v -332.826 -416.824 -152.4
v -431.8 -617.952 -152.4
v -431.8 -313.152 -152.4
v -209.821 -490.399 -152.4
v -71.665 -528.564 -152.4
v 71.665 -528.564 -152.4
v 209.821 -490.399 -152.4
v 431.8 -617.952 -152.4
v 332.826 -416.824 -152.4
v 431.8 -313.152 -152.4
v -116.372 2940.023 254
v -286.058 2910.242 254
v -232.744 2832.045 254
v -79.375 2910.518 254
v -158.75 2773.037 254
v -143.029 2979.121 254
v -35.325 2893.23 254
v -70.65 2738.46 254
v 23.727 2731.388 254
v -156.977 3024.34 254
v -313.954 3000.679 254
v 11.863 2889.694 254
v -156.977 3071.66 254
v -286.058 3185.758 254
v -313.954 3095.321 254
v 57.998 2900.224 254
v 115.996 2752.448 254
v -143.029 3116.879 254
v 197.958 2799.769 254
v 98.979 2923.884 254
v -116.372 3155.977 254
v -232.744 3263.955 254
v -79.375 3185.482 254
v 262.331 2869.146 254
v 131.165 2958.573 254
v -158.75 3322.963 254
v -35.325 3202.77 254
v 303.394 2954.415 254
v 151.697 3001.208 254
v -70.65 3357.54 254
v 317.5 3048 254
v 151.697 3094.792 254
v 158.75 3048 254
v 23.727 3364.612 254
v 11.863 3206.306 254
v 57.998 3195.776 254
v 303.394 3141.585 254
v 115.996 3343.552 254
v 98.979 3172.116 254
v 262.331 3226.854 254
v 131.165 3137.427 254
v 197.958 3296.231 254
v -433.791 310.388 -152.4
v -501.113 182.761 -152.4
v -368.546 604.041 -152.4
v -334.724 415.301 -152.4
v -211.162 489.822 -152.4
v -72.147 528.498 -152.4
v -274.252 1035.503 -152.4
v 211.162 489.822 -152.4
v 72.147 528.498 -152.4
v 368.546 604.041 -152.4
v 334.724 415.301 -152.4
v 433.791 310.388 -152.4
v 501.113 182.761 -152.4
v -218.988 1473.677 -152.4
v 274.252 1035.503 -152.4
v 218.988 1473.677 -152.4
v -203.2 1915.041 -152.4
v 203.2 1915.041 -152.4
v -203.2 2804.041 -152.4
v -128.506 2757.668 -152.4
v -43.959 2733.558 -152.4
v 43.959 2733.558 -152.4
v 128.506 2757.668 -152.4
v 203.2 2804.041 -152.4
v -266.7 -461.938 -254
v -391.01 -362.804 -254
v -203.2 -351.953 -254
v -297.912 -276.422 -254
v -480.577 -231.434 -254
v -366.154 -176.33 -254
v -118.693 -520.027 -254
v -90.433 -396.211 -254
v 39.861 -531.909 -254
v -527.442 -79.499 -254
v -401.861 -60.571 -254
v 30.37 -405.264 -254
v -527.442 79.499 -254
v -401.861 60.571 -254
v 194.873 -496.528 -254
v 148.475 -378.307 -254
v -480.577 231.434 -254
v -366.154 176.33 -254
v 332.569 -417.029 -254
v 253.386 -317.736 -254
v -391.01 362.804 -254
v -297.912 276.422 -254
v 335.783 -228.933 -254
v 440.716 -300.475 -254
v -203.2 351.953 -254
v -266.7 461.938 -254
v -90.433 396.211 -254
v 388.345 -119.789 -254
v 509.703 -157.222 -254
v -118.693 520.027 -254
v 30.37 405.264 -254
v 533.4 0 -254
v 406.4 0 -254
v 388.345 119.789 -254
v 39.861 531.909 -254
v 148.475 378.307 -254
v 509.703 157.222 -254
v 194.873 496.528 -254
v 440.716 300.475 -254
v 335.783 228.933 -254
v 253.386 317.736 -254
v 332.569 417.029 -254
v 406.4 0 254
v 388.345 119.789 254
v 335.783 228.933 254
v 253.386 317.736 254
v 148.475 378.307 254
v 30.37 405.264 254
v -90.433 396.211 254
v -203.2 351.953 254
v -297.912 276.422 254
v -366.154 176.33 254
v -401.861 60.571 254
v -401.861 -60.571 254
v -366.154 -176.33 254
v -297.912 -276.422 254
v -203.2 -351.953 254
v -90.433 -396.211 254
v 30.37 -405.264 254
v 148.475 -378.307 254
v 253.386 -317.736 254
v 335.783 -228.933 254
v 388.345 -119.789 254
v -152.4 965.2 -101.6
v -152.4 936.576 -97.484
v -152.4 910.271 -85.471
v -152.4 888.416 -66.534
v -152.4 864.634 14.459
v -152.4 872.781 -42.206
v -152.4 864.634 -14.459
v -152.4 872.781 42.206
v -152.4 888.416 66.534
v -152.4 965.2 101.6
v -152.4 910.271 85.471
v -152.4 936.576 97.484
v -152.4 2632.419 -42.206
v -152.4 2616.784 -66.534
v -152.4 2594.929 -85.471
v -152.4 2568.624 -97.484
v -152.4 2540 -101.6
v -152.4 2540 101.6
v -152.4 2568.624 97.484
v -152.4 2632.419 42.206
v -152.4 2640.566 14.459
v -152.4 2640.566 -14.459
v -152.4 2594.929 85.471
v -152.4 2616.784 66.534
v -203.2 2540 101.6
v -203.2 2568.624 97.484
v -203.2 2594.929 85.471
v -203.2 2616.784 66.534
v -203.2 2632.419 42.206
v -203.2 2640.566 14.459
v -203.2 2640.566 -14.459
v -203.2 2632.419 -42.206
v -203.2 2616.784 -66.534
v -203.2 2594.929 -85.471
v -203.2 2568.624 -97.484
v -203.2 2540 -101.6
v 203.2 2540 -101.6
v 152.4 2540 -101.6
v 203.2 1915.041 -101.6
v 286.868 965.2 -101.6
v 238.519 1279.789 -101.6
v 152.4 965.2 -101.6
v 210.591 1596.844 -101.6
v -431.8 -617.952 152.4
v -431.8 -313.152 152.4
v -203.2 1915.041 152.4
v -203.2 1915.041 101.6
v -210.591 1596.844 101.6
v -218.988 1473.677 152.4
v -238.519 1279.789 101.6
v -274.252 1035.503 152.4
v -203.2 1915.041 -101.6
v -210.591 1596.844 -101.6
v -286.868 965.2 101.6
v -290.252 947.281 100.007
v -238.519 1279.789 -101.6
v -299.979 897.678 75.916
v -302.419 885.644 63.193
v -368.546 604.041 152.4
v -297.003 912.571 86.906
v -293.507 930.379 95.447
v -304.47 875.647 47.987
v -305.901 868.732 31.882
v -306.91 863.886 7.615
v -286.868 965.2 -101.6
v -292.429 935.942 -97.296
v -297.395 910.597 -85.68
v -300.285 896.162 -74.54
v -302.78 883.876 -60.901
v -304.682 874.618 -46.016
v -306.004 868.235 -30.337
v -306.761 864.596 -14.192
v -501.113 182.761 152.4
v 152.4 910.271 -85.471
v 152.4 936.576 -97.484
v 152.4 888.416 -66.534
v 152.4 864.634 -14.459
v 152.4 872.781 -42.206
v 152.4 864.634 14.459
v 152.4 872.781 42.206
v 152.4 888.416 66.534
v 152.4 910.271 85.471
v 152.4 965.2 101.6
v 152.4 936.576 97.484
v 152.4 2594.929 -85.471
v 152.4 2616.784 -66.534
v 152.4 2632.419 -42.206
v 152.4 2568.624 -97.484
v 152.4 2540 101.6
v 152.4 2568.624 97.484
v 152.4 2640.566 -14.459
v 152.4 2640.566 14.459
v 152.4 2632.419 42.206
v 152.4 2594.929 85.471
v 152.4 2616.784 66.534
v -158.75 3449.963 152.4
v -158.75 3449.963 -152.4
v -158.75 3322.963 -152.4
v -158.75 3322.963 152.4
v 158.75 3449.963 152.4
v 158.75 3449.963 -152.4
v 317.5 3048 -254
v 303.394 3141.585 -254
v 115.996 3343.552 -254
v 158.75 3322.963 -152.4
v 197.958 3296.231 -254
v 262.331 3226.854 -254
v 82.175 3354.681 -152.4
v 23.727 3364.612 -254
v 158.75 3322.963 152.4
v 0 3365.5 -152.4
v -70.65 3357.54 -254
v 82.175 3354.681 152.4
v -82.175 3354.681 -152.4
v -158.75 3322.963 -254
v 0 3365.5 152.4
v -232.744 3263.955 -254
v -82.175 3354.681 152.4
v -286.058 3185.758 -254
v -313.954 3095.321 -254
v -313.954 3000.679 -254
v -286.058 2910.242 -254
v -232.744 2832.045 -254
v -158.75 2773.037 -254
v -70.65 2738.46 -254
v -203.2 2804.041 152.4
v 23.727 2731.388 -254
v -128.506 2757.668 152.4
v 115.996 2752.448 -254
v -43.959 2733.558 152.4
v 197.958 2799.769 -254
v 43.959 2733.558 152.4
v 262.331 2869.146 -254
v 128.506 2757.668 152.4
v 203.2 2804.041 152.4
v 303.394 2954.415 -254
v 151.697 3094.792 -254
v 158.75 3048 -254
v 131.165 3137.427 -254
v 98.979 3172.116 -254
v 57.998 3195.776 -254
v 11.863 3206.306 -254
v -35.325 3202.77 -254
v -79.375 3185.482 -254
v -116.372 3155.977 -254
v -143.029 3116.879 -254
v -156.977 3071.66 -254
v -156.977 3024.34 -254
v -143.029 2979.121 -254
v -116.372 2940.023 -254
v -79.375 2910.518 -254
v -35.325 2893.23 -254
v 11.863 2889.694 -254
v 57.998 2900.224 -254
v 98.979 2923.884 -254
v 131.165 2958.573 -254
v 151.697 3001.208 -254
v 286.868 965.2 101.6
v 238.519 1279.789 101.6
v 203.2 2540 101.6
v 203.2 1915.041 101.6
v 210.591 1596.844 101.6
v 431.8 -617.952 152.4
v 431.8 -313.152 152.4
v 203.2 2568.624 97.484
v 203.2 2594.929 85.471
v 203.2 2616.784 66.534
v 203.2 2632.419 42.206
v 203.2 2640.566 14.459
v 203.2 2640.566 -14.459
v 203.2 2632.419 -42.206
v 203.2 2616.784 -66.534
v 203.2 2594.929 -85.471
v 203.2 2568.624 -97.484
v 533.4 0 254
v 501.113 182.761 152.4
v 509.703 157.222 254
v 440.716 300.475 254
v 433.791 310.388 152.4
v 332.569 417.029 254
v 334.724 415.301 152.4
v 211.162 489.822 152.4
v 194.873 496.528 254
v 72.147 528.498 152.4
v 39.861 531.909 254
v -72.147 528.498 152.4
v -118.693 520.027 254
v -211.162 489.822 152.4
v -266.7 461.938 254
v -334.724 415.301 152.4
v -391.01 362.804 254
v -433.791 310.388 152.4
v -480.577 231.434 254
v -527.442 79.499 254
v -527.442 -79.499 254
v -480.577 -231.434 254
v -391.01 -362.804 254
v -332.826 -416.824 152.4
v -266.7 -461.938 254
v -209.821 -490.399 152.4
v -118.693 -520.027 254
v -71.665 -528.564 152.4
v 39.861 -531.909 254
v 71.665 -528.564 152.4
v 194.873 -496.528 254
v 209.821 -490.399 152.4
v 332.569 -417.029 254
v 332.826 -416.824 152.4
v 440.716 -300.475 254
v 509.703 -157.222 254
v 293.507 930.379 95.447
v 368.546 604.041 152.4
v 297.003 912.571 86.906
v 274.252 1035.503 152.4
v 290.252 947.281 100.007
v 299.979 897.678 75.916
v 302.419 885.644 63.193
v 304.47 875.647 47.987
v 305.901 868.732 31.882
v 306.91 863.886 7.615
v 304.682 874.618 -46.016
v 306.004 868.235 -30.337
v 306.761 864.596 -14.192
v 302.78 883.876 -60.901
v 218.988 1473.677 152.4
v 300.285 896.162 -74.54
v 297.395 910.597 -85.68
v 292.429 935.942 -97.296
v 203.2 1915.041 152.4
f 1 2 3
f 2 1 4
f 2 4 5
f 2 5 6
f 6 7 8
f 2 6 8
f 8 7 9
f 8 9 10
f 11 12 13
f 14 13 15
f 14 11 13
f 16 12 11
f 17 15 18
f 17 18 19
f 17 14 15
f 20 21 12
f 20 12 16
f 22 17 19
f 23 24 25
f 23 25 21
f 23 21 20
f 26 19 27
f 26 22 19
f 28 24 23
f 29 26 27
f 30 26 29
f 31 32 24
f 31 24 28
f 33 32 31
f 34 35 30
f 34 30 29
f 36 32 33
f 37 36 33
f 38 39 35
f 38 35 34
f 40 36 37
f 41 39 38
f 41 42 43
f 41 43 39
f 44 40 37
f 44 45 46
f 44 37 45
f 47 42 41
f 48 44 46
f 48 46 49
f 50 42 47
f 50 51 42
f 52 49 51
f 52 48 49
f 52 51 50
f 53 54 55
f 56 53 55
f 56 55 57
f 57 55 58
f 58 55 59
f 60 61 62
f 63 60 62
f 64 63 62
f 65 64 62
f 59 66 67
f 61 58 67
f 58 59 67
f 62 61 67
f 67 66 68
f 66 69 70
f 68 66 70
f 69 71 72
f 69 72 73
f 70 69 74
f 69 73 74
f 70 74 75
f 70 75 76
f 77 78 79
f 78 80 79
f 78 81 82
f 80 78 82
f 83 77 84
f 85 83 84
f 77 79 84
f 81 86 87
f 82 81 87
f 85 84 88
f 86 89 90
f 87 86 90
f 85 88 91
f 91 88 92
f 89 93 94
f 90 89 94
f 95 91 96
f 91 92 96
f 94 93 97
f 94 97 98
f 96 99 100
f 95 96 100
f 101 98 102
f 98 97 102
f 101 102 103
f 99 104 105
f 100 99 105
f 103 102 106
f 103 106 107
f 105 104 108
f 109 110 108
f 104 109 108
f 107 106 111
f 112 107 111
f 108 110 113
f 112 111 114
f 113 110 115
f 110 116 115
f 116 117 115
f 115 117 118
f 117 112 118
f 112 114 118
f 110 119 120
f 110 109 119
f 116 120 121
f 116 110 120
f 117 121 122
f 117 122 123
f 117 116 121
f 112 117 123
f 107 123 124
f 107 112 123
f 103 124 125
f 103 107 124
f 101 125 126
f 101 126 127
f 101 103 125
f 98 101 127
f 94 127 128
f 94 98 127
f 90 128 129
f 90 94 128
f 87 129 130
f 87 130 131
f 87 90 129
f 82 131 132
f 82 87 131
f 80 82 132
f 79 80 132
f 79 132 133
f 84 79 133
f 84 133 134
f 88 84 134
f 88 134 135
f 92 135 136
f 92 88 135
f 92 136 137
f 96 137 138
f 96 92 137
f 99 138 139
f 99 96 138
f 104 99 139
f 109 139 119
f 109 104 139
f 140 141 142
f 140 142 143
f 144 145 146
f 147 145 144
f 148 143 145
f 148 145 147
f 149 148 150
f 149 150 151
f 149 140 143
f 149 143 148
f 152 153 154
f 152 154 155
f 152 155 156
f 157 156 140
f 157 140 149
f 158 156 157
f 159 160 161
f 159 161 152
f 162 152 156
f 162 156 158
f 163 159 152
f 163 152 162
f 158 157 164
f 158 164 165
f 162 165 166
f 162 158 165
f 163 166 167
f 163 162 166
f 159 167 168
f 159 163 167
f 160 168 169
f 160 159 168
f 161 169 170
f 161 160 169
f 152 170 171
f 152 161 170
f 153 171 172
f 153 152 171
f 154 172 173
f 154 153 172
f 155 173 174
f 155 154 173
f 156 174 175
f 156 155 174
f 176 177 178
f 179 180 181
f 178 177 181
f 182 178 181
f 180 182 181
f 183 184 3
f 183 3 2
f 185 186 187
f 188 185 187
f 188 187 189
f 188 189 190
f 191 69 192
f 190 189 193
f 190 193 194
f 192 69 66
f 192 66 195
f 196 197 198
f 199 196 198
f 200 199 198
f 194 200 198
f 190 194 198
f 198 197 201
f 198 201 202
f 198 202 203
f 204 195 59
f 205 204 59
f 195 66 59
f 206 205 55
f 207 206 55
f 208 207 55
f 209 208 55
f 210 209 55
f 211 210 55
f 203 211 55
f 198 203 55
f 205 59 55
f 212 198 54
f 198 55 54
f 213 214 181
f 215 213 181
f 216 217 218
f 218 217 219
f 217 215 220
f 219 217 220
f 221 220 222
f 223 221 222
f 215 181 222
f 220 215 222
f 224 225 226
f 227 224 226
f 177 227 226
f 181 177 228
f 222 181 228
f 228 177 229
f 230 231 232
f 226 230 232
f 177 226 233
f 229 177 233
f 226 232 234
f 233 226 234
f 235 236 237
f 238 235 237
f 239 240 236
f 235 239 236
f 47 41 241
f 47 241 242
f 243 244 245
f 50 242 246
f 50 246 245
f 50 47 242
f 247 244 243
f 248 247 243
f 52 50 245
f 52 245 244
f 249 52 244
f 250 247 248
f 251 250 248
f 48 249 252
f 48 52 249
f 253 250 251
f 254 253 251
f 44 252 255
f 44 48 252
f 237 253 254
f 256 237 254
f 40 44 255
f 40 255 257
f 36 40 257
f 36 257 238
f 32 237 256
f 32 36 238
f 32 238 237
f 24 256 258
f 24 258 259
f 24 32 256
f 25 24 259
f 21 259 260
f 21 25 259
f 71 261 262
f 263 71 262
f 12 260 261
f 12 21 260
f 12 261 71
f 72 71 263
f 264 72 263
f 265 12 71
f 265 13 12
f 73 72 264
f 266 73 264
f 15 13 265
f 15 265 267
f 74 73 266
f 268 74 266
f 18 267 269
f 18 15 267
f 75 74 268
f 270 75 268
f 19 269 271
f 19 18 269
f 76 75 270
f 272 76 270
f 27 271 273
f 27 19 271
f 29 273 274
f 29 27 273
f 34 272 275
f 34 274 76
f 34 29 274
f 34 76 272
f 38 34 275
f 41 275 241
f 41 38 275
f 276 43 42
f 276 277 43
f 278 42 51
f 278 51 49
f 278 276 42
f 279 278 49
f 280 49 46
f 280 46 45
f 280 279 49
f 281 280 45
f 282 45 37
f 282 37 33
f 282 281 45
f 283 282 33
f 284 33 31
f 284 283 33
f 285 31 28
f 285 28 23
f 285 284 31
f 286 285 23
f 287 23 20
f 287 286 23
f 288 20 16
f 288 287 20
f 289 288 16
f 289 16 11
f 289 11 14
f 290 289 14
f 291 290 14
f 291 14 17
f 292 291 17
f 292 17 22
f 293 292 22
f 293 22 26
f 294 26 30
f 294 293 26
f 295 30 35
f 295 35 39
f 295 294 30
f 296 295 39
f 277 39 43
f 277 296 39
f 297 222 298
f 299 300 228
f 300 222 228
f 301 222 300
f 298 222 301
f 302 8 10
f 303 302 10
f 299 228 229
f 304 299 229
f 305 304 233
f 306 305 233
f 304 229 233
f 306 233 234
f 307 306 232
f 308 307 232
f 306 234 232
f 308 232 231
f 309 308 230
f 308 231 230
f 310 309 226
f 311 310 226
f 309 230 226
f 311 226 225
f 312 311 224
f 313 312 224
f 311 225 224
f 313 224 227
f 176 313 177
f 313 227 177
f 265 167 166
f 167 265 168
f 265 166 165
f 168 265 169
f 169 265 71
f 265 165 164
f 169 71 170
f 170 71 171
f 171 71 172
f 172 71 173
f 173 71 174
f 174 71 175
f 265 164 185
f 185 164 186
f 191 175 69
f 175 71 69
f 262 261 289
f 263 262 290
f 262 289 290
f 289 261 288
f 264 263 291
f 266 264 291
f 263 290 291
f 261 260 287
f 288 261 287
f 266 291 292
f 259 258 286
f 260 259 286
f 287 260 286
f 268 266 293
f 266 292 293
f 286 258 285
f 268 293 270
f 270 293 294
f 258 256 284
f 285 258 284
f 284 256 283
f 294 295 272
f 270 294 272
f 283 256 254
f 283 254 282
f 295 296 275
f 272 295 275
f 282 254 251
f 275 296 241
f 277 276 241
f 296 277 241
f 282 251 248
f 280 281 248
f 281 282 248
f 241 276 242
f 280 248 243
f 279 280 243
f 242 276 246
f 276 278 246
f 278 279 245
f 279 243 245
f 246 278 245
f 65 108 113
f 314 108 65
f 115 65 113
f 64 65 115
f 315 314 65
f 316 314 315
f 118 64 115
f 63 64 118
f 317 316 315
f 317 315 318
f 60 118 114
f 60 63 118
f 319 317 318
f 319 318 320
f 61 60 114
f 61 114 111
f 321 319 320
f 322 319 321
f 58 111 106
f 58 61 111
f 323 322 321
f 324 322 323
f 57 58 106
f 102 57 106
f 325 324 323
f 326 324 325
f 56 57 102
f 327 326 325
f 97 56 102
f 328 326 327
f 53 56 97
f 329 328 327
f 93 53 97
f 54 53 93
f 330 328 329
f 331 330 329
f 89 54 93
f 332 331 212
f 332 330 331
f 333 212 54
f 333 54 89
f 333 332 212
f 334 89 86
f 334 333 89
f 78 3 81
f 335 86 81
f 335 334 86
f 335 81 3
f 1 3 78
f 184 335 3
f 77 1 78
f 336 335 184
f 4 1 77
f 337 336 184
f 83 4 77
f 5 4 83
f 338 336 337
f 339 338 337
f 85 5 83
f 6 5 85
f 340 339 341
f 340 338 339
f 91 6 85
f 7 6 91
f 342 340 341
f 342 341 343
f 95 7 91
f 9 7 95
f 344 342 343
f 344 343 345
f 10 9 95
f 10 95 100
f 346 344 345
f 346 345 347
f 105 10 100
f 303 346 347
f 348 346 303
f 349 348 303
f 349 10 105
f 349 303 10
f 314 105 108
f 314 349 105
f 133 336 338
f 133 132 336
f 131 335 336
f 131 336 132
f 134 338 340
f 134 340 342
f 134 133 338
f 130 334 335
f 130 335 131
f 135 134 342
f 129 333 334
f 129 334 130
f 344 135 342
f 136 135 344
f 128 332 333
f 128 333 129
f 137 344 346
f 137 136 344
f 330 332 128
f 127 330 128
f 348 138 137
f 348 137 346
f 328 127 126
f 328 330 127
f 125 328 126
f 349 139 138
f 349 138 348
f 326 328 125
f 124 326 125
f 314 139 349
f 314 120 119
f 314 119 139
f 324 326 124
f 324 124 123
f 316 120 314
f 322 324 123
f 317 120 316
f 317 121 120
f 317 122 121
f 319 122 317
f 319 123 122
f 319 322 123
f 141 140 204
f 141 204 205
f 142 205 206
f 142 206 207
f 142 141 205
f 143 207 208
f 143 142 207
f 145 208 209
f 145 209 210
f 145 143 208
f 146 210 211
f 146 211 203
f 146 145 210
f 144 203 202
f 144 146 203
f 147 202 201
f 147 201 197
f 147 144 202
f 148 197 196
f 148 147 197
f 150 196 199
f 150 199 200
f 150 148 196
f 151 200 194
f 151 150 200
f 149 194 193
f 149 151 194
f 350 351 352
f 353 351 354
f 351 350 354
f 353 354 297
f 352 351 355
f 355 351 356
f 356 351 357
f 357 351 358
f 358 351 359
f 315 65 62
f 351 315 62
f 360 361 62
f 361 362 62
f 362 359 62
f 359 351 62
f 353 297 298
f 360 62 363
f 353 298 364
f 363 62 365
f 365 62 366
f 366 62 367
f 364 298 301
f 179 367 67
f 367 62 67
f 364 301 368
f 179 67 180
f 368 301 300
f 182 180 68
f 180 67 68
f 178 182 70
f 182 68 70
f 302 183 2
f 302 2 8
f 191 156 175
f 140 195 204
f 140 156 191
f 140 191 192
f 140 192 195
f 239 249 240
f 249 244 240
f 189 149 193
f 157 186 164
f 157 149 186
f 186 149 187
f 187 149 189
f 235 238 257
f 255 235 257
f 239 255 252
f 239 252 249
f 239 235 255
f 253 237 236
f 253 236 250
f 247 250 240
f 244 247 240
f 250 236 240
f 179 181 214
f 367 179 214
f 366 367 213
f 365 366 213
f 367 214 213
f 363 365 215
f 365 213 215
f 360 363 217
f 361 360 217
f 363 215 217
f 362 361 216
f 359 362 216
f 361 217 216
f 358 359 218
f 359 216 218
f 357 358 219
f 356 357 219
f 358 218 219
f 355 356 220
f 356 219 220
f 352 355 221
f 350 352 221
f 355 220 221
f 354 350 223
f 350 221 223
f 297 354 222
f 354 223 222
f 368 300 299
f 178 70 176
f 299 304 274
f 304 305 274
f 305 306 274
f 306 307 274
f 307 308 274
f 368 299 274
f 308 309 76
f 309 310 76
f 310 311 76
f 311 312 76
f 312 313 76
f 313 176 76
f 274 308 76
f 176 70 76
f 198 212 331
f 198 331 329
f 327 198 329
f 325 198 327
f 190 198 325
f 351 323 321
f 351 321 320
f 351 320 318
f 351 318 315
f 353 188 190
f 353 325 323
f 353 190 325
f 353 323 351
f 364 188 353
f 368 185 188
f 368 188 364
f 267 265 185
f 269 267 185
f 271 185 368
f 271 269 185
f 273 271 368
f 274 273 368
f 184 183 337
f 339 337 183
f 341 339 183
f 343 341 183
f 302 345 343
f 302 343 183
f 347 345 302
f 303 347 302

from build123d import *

# Parameters (mm, degrees)
SKETCH1_R             = 317.5
SKETCH1_R_2           = 158.75
BOSS_EXTRUDE1_DEPTH   = 254
SKETCH1_R_3           = 533.4
SKETCH1_R_4           = 406.4
BOSS_EXTRUDE1_2_DEPTH = 254
BOSS_EXTRUDE2_DEPTH   = 152.4
CUT_EXTRUDE1_START    = 152.4
CUT_EXTRUDE1_DEPTH    = 3348.782383063
CUT_EXTRUDE2_START    = -152.4
CUT_EXTRUDE2_DEPTH    = 3348.782383063


with BuildPart() as part:
    # Sketch1 → Boss-Extrude1 (new, symmetric)
    with BuildSketch(Plane.XY):
        with Locations((0, 3048)):
            Circle(SKETCH1_R)
        with Locations((0, 3048)):
            Circle(SKETCH1_R_2, mode=Mode.SUBTRACT)
    extrude(amount=BOSS_EXTRUDE1_DEPTH, both=True)



with BuildPart() as body_2:
    # Sketch1 → Boss-Extrude1 2 (new, symmetric)
    with BuildSketch(Plane.XY):
        Circle(SKETCH1_R_3)
        Circle(SKETCH1_R_4, mode=Mode.SUBTRACT)
    extrude(amount=BOSS_EXTRUDE1_2_DEPTH, both=True)


with BuildPart() as part_1:
    add(part.part)

    add(body_2.part)  # Boss-Extrude2 merges body 2
    # Sketch1<3> → Boss-Extrude2 (add, symmetric)
    with BuildSketch(Plane.XY):
        with BuildLine():
            Line((158.75, 3449.963065702), (-158.75, 3449.963065702))
            Line((-158.75, 3449.963065702), (-158.75, 3322.963065702))
            ThreePointArc((-158.75, 3322.963065702), (0, 3365.5), (158.75, 3322.963065702))
            Line((158.75, 3322.963065702), (158.75, 3449.963065702))
        make_face()
        with BuildLine():
            Line((-203.2, 2804.040966554), (-203.2, 1915.040966554))
            ThreePointArc((-203.2, 1915.040966554), (-274.251603462, 1035.502866401), (-501.112920872, 182.760500479))
            ThreePointArc((-501.112920872, 182.760500479), (0, 533.4), (501.112920872, 182.760500479))
            ThreePointArc((501.112920872, 182.760500479), (274.251603462, 1035.502866401), (203.2, 1915.040966554))
            Line((203.2, 1915.040966554), (203.2, 2804.040966554))
            ThreePointArc((203.2, 2804.040966554), (0, 2730.5), (-203.2, 2804.040966554))
        make_face()
        with BuildLine():
            Line((-431.8, -313.152231351), (-431.8, -617.952231351))
            Line((-431.8, -617.952231351), (431.8, -617.952231351))
            Line((431.8, -617.952231351), (431.8, -313.152231351))
            ThreePointArc((431.8, -313.152231351), (0, -533.4), (-431.8, -313.152231351))
        make_face()
    extrude(amount=BOSS_EXTRUDE2_DEPTH, both=True)

    # Sketch2 → Cut-Extrude1 (cut, through all)
    with BuildSketch(Plane(origin=(0, 0, 0), x_dir=(0, 0, -1), z_dir=(1, 0, 0)).offset(CUT_EXTRUDE1_START)):
        with BuildLine():
            Line((101.6, 2540), (101.6, 965.2))
            ThreePointArc((101.6, 965.2), (0, 863.6), (-101.6, 965.2))
            Line((-101.6, 965.2), (-101.6, 2540))
            ThreePointArc((-101.6, 2540), (0, 2641.6), (101.6, 2540))
        make_face()
    extrude(amount=CUT_EXTRUDE1_DEPTH, mode=Mode.SUBTRACT)

    # Sketch2<2> → Cut-Extrude2 (cut, through all)
    with BuildSketch(Plane(origin=(0, 0, 0), x_dir=(0, 0, -1), z_dir=(1, 0, 0)).offset(CUT_EXTRUDE2_START)):
        with BuildLine():
            Line((101.6, 2540), (101.6, 965.2))
            ThreePointArc((101.6, 965.2), (0, 863.6), (-101.6, 965.2))
            Line((-101.6, 965.2), (-101.6, 2540))
            ThreePointArc((-101.6, 2540), (0, 2641.6), (101.6, 2540))
        make_face()
    extrude(amount=-CUT_EXTRUDE2_DEPTH, mode=Mode.SUBTRACT)


solid = part_1.part
